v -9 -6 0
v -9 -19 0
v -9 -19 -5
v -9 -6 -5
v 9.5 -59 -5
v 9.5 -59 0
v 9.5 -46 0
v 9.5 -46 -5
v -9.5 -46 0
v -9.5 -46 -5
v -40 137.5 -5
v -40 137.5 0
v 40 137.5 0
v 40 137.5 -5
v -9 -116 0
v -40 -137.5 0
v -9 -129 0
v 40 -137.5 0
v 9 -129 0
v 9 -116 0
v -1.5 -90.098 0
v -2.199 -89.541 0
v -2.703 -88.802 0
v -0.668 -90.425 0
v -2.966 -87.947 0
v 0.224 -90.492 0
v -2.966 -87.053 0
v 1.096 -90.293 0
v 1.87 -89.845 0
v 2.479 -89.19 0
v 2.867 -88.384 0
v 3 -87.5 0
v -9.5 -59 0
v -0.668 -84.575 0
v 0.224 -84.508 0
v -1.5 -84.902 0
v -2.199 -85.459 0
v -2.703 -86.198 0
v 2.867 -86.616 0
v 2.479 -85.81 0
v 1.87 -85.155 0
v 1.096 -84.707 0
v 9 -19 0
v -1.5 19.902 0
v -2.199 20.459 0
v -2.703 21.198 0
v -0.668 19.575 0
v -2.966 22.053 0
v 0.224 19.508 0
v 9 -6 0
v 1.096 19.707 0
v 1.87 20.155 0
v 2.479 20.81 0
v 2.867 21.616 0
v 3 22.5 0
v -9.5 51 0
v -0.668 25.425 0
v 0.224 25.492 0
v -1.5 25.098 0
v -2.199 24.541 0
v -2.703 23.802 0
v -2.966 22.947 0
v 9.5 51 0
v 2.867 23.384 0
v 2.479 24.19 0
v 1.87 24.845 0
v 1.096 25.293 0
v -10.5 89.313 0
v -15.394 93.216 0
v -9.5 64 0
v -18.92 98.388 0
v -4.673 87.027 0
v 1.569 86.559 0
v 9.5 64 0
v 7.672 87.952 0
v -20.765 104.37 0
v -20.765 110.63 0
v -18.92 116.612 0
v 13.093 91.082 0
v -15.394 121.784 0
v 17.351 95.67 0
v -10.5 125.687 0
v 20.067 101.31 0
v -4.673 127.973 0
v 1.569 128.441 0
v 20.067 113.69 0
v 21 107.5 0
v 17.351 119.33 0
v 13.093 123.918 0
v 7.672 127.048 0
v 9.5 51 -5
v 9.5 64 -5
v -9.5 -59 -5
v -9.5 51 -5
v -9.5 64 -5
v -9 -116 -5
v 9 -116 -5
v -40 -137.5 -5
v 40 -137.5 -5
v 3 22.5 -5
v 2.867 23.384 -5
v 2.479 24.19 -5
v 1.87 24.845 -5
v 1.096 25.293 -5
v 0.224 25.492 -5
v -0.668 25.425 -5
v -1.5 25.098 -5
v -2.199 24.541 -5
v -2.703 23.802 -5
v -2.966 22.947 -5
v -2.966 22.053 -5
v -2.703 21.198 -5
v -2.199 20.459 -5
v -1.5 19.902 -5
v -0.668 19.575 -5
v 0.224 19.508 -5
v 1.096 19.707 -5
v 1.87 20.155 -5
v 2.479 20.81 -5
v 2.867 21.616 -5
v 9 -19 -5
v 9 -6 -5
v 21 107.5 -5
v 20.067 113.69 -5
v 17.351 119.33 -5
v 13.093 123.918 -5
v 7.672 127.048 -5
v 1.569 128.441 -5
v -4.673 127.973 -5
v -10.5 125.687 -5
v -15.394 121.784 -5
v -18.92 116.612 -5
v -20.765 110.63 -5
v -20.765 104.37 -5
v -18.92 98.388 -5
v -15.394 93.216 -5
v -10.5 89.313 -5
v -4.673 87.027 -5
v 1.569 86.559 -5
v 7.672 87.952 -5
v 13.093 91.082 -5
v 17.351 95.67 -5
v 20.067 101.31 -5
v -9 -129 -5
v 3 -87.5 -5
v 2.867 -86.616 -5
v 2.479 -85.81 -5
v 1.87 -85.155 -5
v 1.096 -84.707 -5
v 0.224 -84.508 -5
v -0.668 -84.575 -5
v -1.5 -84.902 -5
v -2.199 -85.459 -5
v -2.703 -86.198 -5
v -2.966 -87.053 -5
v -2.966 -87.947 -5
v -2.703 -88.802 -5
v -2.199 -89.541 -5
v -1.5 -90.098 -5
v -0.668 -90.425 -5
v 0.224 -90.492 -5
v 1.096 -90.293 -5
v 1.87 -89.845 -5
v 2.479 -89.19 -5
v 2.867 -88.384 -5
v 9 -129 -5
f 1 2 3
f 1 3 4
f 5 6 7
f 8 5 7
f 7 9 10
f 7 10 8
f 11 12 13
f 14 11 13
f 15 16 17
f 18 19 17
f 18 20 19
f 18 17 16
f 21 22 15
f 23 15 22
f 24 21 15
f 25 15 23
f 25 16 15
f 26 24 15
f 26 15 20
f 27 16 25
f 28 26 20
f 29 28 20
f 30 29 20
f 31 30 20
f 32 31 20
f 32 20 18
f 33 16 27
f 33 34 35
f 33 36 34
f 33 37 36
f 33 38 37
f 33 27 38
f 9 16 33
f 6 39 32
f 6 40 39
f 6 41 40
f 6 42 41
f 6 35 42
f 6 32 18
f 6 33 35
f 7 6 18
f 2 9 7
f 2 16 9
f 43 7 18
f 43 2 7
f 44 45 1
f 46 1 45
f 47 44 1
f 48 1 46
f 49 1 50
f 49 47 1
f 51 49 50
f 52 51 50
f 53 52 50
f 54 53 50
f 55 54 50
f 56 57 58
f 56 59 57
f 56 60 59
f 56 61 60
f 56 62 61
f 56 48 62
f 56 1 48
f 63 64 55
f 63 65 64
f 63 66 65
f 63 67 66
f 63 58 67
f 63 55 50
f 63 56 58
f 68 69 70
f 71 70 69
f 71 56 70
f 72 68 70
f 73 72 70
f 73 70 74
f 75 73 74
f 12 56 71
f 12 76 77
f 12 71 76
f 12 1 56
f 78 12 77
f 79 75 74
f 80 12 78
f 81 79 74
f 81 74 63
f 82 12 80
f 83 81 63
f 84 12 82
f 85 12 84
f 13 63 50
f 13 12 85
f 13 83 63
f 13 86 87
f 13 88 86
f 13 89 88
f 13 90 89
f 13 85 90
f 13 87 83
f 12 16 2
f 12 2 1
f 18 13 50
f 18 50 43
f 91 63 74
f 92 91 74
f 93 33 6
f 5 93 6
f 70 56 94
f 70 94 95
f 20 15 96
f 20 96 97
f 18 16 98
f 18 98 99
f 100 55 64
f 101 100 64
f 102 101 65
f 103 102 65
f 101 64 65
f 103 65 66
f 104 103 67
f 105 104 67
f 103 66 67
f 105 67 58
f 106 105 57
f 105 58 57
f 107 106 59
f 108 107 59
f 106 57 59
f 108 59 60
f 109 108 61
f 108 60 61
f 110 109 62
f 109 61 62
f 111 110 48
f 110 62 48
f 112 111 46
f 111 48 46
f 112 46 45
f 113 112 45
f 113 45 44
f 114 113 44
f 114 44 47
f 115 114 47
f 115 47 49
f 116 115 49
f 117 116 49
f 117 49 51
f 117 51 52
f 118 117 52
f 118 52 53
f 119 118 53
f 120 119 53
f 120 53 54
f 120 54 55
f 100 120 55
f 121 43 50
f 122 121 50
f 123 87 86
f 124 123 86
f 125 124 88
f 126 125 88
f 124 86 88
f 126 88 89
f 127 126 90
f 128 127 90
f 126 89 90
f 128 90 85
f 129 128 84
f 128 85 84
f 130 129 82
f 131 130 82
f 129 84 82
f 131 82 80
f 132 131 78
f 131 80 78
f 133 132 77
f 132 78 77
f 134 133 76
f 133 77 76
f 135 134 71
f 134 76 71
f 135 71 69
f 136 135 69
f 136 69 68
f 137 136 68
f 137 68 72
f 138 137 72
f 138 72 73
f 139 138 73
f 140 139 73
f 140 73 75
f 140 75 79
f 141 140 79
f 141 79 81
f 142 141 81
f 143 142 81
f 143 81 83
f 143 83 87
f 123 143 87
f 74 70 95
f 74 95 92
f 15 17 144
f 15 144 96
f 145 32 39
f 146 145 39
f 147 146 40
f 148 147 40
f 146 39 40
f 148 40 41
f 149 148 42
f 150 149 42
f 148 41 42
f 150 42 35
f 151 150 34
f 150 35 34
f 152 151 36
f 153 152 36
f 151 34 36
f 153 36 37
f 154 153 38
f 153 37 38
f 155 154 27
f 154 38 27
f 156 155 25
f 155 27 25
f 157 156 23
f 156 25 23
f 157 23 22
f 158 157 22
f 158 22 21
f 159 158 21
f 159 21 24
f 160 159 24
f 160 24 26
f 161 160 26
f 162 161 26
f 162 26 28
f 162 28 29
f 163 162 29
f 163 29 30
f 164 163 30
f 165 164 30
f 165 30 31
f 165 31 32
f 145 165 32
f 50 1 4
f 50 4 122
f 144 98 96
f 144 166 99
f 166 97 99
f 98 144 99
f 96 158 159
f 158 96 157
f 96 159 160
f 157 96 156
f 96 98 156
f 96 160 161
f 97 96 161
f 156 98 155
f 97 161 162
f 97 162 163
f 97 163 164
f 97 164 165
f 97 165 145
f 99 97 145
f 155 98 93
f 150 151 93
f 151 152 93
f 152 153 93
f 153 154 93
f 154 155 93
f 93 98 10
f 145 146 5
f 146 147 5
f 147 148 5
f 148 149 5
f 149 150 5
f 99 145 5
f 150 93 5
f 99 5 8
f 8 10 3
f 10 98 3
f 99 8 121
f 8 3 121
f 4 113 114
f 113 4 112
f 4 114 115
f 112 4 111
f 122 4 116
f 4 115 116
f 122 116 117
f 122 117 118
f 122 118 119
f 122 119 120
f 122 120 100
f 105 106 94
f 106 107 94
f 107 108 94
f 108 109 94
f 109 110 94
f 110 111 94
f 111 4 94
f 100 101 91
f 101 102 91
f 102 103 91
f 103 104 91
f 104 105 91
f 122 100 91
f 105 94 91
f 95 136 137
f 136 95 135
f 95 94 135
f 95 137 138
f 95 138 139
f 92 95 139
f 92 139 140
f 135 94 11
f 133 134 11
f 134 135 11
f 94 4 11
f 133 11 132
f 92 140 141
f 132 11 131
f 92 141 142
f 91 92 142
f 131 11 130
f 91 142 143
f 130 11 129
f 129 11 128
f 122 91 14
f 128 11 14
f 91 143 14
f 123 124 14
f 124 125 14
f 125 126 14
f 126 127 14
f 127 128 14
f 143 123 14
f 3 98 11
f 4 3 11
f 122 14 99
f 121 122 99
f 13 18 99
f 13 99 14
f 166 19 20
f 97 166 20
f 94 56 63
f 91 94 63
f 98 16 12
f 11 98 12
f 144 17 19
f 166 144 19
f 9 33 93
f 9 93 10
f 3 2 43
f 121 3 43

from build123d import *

# Parameters (mm, degrees)
ESQUISSE1_W             = 80
ESQUISSE1_H             = 275
BOSS_EXTRU_1_DEPTH      = 5
ESQUISSE2_R             = 21
ESQUISSE2_R_2           = 3
ESQUISSE2_W             = 18
ESQUISSE2_H             = 13
ESQUISSE2_W_2           = 19
ENL_V_MAT_EXTRU_1_DEPTH = 6


with BuildPart() as part:
    # Esquisse1 → Boss.-Extru.1 (new body)
    with BuildSketch(Plane.XY):
        Rectangle(ESQUISSE1_W, ESQUISSE1_H)
    extrude(amount=-BOSS_EXTRU_1_DEPTH)

    # Esquisse2 → Enlèv. mat.-Extru.1 (cut, through all)
    with BuildSketch(Plane.XY):
        with Locations((0, 107.5)):
            Circle(ESQUISSE2_R)
        with Locations((0, 22.5)):
            Circle(ESQUISSE2_R_2)
        with Locations((0, -87.5)):
            Circle(ESQUISSE2_R_2)
        with Locations((0, -122.5)):
            Rectangle(ESQUISSE2_W, ESQUISSE2_H)
        with Locations((0, 57.5)):
            Rectangle(ESQUISSE2_W_2, ESQUISSE2_H)
        with Locations((0, -12.5)):
            Rectangle(ESQUISSE2_W, ESQUISSE2_H)
        with Locations((0, -52.5)):
            Rectangle(ESQUISSE2_W_2, ESQUISSE2_H)
    extrude(amount=-ENL_V_MAT_EXTRU_1_DEPTH, mode=Mode.SUBTRACT)


solid = part.part
